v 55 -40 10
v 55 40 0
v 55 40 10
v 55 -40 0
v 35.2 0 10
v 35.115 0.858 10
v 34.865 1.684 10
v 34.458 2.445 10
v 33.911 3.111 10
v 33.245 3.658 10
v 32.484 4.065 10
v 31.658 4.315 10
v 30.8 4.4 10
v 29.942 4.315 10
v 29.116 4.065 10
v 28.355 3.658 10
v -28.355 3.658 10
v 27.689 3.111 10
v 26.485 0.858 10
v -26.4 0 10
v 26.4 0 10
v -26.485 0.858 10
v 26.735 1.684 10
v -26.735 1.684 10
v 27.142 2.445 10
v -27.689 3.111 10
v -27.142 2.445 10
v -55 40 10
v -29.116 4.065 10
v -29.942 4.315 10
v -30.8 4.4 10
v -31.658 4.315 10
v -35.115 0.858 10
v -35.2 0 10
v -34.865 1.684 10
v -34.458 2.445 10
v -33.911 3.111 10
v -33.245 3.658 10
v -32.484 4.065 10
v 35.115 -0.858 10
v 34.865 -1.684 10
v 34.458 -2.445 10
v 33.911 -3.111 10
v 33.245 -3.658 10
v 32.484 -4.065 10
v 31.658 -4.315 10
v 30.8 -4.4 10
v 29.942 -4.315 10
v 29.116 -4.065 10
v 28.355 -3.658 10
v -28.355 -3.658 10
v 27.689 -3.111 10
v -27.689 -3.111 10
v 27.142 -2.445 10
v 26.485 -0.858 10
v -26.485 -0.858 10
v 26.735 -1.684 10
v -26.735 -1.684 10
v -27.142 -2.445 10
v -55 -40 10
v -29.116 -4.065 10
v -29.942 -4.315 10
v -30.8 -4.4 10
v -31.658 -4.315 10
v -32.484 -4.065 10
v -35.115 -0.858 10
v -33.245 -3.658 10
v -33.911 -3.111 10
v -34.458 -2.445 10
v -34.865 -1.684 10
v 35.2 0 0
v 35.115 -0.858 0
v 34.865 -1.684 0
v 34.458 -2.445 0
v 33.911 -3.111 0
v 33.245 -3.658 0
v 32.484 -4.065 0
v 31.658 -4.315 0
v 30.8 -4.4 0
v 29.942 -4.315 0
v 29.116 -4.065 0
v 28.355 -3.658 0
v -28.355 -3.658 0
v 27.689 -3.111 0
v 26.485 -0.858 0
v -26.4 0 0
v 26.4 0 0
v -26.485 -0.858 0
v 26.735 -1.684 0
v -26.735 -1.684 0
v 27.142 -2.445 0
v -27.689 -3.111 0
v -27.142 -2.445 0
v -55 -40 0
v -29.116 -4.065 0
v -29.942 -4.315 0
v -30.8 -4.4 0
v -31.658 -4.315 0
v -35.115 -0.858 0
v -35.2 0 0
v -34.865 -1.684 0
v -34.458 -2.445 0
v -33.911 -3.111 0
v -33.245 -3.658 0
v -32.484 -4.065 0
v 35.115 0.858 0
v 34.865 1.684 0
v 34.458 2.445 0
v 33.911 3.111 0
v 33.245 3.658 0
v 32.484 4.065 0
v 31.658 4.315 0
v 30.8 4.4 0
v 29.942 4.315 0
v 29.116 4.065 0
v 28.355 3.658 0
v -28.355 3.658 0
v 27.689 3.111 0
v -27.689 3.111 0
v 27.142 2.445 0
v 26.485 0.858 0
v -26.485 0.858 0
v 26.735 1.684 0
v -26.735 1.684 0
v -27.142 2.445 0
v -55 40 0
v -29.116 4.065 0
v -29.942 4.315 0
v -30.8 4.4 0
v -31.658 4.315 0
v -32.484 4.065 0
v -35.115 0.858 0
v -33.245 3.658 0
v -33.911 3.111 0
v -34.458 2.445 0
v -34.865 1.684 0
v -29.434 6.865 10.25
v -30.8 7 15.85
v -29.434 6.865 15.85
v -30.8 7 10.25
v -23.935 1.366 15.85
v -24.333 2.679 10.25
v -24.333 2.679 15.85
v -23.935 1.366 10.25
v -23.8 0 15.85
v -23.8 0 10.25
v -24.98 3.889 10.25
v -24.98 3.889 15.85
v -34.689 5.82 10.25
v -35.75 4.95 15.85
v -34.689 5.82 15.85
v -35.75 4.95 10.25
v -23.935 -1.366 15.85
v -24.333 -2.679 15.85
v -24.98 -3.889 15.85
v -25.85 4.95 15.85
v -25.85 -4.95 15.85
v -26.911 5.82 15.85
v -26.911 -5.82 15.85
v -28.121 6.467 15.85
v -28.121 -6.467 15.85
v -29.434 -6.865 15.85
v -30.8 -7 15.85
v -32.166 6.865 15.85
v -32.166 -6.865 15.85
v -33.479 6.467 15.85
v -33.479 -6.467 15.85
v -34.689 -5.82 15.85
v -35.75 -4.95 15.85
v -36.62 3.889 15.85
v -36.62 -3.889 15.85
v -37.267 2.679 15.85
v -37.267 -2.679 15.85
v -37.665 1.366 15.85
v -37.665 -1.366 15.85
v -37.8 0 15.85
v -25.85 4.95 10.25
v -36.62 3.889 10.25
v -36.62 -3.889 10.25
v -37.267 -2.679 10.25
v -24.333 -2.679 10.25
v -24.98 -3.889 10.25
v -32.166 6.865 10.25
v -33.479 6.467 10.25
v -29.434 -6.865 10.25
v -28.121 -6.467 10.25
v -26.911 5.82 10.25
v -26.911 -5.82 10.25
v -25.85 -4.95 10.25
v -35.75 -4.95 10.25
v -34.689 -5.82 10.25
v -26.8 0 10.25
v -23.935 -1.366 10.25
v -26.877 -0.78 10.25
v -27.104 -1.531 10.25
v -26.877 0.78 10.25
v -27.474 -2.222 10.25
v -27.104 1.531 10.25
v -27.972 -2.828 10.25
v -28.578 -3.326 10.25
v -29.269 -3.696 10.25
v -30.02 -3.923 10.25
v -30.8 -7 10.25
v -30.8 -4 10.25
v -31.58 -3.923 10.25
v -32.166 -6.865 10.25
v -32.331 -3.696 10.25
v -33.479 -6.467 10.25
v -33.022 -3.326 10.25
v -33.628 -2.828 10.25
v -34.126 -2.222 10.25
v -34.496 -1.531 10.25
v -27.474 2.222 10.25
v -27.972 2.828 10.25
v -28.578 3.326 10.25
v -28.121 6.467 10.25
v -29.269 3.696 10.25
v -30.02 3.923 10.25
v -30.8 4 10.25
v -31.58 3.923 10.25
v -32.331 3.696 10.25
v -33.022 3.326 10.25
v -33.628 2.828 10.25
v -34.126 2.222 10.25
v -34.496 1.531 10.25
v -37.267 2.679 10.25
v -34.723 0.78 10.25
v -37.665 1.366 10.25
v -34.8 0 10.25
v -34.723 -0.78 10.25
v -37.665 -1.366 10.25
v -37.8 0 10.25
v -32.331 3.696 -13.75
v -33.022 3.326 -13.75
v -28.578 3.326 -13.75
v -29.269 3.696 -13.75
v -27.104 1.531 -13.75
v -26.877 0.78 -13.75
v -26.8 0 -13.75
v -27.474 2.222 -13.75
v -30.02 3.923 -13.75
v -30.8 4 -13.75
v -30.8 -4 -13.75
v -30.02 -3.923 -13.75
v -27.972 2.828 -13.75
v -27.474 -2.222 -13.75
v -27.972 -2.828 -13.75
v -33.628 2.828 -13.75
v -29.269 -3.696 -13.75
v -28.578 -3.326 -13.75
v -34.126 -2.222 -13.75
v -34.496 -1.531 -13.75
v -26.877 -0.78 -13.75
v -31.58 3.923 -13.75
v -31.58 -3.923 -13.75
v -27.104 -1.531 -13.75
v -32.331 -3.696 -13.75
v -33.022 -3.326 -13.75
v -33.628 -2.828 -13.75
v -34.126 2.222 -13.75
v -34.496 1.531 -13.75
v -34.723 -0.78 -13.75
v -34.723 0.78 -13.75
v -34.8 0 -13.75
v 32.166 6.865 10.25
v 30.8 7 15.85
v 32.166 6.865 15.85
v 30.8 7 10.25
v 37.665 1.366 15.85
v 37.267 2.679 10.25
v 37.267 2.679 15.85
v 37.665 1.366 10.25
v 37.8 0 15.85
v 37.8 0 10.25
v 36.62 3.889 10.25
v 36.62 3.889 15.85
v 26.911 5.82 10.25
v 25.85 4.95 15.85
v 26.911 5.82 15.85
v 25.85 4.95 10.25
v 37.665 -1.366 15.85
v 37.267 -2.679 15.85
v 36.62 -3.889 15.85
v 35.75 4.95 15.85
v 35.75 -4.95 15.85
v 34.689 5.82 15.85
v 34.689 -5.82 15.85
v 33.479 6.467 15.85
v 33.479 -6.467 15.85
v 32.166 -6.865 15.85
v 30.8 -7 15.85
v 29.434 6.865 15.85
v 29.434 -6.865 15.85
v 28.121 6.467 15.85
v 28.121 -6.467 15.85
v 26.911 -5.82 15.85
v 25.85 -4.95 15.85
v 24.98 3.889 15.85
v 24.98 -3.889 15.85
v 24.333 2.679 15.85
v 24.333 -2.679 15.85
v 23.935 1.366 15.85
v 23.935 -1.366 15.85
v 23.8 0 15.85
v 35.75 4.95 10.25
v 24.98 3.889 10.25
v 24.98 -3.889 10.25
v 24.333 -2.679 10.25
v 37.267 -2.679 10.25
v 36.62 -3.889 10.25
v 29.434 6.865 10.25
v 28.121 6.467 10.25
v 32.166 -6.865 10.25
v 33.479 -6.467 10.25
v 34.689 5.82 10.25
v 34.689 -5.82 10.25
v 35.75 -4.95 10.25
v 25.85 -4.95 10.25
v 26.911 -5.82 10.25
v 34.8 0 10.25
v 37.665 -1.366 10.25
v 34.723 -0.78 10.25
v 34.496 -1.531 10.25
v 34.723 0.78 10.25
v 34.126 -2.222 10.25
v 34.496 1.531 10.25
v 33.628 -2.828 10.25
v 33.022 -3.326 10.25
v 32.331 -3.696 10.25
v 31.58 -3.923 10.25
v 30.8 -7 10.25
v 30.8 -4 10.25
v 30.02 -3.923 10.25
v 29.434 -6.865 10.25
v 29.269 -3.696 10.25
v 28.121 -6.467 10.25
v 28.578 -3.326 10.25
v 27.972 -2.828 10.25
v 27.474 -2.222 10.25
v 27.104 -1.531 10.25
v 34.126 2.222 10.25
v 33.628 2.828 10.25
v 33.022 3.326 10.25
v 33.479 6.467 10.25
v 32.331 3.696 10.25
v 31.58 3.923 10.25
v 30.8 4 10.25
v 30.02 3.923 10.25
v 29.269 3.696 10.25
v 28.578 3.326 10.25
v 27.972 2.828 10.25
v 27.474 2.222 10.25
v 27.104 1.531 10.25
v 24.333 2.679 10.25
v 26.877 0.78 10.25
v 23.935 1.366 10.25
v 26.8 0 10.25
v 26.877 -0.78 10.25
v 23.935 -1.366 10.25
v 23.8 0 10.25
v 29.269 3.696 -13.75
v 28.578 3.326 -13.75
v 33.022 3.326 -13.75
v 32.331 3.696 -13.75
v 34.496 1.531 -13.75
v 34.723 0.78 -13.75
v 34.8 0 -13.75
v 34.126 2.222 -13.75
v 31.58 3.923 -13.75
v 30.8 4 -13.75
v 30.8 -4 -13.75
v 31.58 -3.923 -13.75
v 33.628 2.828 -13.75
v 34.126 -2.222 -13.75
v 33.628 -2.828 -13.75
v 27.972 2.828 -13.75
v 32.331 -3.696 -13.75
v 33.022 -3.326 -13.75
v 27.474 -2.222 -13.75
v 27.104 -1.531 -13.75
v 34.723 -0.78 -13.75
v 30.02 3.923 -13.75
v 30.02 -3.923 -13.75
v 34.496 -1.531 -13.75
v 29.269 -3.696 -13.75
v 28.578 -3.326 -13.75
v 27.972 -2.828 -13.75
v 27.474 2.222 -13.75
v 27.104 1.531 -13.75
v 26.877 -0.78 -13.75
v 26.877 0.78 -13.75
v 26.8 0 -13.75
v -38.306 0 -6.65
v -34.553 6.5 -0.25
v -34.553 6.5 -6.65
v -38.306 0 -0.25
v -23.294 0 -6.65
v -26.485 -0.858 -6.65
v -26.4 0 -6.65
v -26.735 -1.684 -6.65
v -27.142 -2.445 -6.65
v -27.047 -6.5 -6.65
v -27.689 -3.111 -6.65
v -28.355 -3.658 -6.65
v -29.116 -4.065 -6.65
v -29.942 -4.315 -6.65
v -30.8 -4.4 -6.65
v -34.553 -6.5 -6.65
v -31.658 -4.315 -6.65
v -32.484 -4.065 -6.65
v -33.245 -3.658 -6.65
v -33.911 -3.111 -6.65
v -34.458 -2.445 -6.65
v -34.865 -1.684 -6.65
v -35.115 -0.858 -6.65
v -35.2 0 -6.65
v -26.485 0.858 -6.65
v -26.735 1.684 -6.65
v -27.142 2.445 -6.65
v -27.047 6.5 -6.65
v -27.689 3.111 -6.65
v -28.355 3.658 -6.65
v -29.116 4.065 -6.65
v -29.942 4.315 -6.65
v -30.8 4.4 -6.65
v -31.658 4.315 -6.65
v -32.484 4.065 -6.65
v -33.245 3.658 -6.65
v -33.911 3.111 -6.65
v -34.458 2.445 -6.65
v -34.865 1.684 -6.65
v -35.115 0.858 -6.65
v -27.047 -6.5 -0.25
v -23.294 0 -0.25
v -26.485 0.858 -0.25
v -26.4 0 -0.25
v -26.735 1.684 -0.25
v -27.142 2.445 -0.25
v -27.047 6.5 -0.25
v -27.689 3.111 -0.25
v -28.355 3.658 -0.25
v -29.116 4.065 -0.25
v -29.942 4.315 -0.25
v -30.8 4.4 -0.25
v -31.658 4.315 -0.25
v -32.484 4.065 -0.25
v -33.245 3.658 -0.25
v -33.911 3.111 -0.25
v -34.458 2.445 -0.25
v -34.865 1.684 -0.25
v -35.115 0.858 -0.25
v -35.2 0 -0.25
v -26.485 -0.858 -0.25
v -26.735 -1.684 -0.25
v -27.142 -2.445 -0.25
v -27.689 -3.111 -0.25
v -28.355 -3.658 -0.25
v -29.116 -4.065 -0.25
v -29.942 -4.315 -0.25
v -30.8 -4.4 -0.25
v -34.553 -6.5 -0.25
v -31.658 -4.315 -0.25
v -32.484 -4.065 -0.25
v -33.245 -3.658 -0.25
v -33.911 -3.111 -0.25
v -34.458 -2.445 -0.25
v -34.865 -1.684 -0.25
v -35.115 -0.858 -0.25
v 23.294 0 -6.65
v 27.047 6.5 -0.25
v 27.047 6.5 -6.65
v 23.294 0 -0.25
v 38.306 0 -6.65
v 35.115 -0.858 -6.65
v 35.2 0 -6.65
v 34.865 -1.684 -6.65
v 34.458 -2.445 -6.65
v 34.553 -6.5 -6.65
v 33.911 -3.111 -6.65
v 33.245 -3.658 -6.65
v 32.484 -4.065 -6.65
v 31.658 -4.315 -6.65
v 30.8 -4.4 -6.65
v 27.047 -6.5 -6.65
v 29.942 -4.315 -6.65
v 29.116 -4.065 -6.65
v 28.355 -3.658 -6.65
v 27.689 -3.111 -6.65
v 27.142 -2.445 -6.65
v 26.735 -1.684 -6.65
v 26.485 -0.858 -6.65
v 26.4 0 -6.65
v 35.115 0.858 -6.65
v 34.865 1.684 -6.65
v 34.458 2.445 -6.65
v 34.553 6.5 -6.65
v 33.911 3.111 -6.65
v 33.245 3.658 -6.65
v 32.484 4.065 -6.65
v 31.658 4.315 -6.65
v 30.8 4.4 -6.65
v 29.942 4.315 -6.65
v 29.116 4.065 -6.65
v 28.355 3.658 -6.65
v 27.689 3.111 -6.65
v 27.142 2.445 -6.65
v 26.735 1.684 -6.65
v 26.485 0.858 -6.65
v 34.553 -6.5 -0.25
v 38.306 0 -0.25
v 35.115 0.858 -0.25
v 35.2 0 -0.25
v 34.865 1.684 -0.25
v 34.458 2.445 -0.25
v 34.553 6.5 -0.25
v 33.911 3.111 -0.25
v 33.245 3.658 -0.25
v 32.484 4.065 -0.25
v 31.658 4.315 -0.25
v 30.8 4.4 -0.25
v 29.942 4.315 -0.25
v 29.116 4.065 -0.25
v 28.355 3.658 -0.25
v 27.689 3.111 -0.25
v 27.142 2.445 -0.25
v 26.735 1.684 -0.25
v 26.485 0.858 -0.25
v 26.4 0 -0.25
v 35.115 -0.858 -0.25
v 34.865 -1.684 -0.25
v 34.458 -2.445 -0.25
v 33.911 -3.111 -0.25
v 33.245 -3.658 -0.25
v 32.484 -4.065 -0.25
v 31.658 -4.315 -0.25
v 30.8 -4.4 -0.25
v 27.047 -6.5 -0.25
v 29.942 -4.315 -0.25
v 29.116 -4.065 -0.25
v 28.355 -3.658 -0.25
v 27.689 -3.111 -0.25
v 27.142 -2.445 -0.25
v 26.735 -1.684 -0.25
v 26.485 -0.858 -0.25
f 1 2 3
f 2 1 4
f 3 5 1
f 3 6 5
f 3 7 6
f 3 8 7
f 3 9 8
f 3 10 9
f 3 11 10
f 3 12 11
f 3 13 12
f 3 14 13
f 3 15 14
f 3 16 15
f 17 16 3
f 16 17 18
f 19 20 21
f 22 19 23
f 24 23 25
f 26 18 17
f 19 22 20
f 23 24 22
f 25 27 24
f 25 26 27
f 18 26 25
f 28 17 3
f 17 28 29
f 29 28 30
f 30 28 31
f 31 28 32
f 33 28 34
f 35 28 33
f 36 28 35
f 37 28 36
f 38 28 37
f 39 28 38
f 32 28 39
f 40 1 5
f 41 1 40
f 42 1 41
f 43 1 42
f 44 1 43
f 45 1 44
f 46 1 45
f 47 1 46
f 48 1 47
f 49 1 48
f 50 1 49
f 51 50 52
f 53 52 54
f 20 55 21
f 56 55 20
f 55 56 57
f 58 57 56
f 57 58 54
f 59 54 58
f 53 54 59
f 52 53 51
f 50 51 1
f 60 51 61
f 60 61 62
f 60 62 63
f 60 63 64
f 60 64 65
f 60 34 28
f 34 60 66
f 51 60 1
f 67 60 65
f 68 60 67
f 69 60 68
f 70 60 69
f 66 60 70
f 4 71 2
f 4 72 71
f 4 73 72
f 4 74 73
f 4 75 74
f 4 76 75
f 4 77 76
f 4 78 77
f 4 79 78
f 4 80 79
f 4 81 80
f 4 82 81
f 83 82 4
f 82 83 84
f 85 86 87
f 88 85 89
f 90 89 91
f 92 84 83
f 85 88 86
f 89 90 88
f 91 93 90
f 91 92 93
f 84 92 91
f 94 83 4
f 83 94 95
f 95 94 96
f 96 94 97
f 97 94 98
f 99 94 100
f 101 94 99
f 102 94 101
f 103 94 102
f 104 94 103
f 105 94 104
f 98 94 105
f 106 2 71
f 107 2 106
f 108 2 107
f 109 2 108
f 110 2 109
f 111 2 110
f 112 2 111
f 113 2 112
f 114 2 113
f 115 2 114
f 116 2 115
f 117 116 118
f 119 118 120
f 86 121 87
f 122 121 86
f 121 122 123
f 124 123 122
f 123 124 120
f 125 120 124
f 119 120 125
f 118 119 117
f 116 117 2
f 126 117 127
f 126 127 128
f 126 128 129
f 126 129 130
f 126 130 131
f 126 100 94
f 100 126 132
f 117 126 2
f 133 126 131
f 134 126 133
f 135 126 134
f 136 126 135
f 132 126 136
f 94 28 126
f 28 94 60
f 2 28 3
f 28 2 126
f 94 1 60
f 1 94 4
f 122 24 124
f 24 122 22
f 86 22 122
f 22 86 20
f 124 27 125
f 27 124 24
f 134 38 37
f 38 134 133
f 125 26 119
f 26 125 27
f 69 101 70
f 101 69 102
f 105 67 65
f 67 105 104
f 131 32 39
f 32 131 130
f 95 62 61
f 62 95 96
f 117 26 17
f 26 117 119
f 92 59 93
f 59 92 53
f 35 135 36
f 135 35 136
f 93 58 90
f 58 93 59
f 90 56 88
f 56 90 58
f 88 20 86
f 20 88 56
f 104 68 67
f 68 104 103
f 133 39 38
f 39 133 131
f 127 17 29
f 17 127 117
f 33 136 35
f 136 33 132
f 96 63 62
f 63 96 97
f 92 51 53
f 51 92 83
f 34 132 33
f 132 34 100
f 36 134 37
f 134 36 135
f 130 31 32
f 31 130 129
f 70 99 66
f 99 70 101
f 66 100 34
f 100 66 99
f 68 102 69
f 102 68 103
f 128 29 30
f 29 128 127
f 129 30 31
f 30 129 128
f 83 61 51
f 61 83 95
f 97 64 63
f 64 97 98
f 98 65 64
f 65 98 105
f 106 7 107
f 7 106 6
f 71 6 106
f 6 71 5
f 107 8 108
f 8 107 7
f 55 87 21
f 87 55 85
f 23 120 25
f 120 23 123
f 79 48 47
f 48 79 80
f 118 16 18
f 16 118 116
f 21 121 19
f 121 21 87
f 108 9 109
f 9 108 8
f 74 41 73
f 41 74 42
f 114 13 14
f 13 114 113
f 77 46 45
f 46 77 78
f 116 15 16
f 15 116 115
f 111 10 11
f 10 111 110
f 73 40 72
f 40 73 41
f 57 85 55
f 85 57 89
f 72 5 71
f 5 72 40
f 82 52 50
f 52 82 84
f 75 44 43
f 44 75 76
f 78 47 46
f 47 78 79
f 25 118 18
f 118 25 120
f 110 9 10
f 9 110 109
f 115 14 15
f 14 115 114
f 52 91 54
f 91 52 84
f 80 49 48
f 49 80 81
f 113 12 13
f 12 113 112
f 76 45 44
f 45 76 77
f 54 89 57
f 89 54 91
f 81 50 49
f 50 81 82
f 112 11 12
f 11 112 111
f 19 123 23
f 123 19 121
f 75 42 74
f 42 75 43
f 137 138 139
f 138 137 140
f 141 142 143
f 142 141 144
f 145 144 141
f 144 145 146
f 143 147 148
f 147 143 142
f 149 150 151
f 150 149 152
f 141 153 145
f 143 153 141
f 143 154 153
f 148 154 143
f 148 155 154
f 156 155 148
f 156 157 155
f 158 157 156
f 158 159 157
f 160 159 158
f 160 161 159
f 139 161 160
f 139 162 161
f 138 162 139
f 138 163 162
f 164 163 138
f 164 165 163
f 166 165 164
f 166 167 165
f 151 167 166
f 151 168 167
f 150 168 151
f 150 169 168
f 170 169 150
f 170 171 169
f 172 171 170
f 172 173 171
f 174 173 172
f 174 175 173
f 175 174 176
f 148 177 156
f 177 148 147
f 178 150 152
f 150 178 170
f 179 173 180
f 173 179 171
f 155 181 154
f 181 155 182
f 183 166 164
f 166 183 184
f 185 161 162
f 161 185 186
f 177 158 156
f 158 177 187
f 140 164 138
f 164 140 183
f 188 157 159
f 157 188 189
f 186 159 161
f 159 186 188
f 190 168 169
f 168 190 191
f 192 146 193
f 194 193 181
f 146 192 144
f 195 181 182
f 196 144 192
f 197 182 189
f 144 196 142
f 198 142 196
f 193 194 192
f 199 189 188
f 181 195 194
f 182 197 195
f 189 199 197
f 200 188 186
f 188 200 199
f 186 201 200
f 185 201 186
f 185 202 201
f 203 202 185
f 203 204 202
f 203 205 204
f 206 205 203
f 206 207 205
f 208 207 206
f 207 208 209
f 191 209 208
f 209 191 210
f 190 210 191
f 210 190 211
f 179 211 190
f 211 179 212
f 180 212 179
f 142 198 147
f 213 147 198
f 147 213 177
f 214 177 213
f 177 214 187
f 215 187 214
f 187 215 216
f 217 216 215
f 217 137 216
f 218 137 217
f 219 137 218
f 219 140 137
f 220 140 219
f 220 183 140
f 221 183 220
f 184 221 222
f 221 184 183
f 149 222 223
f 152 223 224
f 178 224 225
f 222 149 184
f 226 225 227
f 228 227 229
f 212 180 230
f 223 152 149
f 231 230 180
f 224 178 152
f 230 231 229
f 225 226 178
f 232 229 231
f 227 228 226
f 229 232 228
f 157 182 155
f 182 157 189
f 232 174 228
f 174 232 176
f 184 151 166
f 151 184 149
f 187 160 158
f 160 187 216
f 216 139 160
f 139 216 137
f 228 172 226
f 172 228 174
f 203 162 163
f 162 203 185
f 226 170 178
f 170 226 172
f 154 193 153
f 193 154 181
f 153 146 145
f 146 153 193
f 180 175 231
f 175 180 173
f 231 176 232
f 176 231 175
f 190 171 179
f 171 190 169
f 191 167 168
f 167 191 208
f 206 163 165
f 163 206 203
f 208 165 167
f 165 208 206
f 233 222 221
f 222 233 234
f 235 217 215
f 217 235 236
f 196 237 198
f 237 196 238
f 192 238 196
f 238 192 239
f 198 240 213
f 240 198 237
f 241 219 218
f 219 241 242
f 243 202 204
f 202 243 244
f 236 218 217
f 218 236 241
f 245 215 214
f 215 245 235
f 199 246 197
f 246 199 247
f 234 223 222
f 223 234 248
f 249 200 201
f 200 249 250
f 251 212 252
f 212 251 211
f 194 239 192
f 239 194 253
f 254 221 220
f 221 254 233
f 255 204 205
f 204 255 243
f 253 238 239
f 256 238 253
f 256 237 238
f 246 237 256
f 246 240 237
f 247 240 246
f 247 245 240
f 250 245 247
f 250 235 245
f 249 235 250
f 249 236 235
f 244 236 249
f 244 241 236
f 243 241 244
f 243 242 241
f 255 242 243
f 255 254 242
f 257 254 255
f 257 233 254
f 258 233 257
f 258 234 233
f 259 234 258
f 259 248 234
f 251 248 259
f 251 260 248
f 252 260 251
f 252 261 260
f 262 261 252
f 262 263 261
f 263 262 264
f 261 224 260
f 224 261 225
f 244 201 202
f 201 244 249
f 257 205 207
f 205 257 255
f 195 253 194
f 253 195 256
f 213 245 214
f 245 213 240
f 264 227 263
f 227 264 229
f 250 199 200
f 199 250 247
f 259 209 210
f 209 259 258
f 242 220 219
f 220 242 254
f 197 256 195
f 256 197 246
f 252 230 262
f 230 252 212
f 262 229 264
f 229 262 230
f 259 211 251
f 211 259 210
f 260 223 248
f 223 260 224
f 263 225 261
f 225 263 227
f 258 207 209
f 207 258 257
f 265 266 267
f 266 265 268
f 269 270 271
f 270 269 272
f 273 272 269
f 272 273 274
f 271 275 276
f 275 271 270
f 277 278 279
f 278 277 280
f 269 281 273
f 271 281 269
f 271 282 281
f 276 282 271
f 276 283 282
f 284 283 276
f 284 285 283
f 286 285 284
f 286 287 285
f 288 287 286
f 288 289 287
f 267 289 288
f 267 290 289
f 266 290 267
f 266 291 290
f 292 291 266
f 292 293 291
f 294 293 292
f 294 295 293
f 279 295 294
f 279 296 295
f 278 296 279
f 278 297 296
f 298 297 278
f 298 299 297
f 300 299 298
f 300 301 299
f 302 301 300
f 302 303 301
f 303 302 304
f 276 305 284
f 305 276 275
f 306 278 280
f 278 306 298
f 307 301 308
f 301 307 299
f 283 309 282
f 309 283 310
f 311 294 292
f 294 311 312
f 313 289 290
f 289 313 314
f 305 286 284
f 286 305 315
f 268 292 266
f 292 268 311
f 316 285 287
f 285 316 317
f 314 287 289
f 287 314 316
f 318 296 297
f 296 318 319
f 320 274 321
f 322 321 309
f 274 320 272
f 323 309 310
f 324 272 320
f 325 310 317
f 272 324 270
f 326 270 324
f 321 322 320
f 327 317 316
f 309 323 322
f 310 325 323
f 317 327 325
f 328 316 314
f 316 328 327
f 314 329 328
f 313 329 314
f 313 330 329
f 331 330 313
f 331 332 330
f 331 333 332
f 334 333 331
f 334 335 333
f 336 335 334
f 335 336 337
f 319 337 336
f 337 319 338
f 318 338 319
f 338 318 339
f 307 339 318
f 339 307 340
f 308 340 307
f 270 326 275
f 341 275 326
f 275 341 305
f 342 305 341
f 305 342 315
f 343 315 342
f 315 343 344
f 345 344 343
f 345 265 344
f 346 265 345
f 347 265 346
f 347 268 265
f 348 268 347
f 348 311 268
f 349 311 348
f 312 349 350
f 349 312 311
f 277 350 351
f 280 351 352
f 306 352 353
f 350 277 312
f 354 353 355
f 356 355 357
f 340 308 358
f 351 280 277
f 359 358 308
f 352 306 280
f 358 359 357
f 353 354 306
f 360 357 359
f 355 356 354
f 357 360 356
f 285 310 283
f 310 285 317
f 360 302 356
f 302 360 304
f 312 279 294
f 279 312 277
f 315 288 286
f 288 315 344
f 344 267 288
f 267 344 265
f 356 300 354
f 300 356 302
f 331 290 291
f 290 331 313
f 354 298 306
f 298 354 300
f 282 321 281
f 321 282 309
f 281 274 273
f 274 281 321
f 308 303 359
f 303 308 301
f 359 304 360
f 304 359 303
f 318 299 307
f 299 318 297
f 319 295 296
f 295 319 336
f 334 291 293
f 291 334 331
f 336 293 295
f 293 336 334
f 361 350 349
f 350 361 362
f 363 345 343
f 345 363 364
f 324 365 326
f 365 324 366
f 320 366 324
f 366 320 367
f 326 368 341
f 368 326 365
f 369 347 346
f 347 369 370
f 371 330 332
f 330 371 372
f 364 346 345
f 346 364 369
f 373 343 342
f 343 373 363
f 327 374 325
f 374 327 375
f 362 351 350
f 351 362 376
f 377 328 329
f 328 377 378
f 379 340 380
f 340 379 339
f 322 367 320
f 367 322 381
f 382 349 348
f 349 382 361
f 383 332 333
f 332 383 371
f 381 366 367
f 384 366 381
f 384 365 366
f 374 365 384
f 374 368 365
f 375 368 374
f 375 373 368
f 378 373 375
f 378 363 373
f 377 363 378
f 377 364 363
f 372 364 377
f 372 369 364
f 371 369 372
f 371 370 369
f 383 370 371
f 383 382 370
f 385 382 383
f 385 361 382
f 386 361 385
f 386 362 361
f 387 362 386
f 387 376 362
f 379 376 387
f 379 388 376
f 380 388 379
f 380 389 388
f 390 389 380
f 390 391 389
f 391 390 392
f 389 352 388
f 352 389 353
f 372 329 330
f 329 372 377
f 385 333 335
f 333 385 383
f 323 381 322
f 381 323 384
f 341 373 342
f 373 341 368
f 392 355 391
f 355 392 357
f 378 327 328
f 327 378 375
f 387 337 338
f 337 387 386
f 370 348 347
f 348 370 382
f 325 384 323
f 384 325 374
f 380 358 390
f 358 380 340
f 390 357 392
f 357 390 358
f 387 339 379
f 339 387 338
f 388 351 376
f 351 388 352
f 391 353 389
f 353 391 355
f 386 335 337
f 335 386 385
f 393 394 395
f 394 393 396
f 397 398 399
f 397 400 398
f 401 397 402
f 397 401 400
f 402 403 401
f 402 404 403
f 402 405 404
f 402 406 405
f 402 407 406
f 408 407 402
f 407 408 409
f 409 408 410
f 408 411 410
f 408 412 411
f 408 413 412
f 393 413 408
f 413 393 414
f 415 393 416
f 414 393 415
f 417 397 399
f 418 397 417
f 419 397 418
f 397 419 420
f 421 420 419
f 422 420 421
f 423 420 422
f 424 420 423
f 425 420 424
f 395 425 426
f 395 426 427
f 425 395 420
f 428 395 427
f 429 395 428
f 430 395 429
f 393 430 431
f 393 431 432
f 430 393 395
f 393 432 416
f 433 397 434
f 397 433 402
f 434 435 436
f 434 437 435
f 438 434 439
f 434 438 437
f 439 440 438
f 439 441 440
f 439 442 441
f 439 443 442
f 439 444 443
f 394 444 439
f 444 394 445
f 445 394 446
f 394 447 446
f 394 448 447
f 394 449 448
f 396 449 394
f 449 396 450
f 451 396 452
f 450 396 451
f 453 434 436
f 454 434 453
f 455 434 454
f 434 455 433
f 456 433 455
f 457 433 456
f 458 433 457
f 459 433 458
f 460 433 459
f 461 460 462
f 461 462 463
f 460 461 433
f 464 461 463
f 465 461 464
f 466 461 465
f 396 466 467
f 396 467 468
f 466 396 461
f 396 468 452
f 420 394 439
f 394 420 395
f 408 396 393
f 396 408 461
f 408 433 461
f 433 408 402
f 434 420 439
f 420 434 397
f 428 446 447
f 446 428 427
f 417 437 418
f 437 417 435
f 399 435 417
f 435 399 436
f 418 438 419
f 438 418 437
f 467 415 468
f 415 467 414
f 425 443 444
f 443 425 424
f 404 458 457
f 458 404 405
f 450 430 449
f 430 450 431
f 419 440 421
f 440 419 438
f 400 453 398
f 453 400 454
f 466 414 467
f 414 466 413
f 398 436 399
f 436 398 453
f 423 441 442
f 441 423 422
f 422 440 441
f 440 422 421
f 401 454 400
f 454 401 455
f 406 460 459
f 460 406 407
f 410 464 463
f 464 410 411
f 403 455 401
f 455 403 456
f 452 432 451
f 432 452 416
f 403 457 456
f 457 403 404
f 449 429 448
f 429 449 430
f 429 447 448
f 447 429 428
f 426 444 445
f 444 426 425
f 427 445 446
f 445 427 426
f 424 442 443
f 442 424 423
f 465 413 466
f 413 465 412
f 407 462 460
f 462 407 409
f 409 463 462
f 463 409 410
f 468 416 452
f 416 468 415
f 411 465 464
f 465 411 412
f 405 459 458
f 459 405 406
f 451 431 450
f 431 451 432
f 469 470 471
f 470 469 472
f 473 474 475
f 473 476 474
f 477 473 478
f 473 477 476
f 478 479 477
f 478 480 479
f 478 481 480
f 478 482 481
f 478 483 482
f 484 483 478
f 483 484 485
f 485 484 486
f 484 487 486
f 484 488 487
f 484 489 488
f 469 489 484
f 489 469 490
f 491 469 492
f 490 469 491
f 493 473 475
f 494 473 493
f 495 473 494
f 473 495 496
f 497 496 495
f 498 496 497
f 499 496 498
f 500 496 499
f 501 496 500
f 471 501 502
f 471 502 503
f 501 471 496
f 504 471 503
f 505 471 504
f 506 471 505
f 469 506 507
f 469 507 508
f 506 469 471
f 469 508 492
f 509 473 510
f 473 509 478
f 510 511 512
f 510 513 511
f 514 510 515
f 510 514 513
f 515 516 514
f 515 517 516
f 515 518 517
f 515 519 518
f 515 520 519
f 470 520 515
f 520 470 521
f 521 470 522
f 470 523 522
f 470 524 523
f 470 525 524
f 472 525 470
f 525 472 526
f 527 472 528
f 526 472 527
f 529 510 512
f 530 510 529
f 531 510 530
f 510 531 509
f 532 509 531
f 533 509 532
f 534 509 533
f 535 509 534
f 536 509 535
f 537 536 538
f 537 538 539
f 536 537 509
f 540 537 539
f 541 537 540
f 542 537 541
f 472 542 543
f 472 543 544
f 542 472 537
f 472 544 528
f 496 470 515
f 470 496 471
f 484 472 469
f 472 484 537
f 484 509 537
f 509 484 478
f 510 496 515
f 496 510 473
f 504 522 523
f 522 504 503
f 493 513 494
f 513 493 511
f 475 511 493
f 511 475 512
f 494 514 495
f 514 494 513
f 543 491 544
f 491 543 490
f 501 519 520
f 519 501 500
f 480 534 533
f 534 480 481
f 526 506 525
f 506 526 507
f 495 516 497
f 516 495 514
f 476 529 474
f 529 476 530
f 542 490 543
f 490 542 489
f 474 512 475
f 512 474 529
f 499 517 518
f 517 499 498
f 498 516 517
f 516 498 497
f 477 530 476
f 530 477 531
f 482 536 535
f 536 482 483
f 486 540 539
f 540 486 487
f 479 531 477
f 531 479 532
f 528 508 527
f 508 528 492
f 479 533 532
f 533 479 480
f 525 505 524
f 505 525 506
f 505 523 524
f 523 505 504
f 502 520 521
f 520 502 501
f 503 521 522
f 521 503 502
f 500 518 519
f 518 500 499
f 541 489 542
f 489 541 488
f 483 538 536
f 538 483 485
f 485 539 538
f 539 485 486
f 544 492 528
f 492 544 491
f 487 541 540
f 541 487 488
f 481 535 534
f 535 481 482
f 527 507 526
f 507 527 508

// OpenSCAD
$fn = 32;

// ------------------------------------------------------------------------
// Bolted plate: 110 x 80 x 10 mm plate, 2 fasteners
// Every part is its own module, assembly() places them once.
// ------------------------------------------------------------------------

// --- part 1 ---
module plate() {
  difference() {
    translate([-55, -40, 0]) cube([110, 80, 10]);
    translate([-30.8, 0, -1]) cylinder(h = 12, d = 8.8);
    translate([30.8, 0, -1]) cylinder(h = 12, d = 8.8);
  }
}

// --- part 2 ---
module bolt1() {
  cylinder(h = 5.6, d = 14);
  translate([0, 0, -24]) cylinder(h = 24, d = 8);
}

// --- part 3 ---
module bolt2() {
  cylinder(h = 5.6, d = 14);
  translate([0, 0, -24]) cylinder(h = 24, d = 8);
}

// --- part 4 ---
module nut1() {
  difference() {
    linear_extrude(height = 6.4) polygon(points = [[7.506, 0], [3.753, 6.5], [-3.753, 6.5], [-7.506, 0], [-3.753, -6.5], [3.753, -6.5]]);
    translate([0, 0, -1]) cylinder(h = 8.4, d = 8.8);
  }
}

// --- part 5 ---
module nut2() {
  difference() {
    linear_extrude(height = 6.4) polygon(points = [[7.506, 0], [3.753, 6.5], [-3.753, 6.5], [-7.506, 0], [-3.753, -6.5], [3.753, -6.5]]);
    translate([0, 0, -1]) cylinder(h = 8.4, d = 8.8);
  }
}

// --- assembly ---
module assembly() {
  translate([0, 0, 0]) rotate([0, 0, 0]) plate();
  translate([-30.8, 0, 10.25]) rotate([0, 0, 0]) bolt1();
  translate([30.8, 0, 10.25]) rotate([0, 0, 0]) bolt2();
  translate([-30.8, 0, -6.65]) rotate([0, 0, 0]) nut1();
  translate([30.8, 0, -6.65]) rotate([0, 0, 0]) nut2();
}

assembly();
